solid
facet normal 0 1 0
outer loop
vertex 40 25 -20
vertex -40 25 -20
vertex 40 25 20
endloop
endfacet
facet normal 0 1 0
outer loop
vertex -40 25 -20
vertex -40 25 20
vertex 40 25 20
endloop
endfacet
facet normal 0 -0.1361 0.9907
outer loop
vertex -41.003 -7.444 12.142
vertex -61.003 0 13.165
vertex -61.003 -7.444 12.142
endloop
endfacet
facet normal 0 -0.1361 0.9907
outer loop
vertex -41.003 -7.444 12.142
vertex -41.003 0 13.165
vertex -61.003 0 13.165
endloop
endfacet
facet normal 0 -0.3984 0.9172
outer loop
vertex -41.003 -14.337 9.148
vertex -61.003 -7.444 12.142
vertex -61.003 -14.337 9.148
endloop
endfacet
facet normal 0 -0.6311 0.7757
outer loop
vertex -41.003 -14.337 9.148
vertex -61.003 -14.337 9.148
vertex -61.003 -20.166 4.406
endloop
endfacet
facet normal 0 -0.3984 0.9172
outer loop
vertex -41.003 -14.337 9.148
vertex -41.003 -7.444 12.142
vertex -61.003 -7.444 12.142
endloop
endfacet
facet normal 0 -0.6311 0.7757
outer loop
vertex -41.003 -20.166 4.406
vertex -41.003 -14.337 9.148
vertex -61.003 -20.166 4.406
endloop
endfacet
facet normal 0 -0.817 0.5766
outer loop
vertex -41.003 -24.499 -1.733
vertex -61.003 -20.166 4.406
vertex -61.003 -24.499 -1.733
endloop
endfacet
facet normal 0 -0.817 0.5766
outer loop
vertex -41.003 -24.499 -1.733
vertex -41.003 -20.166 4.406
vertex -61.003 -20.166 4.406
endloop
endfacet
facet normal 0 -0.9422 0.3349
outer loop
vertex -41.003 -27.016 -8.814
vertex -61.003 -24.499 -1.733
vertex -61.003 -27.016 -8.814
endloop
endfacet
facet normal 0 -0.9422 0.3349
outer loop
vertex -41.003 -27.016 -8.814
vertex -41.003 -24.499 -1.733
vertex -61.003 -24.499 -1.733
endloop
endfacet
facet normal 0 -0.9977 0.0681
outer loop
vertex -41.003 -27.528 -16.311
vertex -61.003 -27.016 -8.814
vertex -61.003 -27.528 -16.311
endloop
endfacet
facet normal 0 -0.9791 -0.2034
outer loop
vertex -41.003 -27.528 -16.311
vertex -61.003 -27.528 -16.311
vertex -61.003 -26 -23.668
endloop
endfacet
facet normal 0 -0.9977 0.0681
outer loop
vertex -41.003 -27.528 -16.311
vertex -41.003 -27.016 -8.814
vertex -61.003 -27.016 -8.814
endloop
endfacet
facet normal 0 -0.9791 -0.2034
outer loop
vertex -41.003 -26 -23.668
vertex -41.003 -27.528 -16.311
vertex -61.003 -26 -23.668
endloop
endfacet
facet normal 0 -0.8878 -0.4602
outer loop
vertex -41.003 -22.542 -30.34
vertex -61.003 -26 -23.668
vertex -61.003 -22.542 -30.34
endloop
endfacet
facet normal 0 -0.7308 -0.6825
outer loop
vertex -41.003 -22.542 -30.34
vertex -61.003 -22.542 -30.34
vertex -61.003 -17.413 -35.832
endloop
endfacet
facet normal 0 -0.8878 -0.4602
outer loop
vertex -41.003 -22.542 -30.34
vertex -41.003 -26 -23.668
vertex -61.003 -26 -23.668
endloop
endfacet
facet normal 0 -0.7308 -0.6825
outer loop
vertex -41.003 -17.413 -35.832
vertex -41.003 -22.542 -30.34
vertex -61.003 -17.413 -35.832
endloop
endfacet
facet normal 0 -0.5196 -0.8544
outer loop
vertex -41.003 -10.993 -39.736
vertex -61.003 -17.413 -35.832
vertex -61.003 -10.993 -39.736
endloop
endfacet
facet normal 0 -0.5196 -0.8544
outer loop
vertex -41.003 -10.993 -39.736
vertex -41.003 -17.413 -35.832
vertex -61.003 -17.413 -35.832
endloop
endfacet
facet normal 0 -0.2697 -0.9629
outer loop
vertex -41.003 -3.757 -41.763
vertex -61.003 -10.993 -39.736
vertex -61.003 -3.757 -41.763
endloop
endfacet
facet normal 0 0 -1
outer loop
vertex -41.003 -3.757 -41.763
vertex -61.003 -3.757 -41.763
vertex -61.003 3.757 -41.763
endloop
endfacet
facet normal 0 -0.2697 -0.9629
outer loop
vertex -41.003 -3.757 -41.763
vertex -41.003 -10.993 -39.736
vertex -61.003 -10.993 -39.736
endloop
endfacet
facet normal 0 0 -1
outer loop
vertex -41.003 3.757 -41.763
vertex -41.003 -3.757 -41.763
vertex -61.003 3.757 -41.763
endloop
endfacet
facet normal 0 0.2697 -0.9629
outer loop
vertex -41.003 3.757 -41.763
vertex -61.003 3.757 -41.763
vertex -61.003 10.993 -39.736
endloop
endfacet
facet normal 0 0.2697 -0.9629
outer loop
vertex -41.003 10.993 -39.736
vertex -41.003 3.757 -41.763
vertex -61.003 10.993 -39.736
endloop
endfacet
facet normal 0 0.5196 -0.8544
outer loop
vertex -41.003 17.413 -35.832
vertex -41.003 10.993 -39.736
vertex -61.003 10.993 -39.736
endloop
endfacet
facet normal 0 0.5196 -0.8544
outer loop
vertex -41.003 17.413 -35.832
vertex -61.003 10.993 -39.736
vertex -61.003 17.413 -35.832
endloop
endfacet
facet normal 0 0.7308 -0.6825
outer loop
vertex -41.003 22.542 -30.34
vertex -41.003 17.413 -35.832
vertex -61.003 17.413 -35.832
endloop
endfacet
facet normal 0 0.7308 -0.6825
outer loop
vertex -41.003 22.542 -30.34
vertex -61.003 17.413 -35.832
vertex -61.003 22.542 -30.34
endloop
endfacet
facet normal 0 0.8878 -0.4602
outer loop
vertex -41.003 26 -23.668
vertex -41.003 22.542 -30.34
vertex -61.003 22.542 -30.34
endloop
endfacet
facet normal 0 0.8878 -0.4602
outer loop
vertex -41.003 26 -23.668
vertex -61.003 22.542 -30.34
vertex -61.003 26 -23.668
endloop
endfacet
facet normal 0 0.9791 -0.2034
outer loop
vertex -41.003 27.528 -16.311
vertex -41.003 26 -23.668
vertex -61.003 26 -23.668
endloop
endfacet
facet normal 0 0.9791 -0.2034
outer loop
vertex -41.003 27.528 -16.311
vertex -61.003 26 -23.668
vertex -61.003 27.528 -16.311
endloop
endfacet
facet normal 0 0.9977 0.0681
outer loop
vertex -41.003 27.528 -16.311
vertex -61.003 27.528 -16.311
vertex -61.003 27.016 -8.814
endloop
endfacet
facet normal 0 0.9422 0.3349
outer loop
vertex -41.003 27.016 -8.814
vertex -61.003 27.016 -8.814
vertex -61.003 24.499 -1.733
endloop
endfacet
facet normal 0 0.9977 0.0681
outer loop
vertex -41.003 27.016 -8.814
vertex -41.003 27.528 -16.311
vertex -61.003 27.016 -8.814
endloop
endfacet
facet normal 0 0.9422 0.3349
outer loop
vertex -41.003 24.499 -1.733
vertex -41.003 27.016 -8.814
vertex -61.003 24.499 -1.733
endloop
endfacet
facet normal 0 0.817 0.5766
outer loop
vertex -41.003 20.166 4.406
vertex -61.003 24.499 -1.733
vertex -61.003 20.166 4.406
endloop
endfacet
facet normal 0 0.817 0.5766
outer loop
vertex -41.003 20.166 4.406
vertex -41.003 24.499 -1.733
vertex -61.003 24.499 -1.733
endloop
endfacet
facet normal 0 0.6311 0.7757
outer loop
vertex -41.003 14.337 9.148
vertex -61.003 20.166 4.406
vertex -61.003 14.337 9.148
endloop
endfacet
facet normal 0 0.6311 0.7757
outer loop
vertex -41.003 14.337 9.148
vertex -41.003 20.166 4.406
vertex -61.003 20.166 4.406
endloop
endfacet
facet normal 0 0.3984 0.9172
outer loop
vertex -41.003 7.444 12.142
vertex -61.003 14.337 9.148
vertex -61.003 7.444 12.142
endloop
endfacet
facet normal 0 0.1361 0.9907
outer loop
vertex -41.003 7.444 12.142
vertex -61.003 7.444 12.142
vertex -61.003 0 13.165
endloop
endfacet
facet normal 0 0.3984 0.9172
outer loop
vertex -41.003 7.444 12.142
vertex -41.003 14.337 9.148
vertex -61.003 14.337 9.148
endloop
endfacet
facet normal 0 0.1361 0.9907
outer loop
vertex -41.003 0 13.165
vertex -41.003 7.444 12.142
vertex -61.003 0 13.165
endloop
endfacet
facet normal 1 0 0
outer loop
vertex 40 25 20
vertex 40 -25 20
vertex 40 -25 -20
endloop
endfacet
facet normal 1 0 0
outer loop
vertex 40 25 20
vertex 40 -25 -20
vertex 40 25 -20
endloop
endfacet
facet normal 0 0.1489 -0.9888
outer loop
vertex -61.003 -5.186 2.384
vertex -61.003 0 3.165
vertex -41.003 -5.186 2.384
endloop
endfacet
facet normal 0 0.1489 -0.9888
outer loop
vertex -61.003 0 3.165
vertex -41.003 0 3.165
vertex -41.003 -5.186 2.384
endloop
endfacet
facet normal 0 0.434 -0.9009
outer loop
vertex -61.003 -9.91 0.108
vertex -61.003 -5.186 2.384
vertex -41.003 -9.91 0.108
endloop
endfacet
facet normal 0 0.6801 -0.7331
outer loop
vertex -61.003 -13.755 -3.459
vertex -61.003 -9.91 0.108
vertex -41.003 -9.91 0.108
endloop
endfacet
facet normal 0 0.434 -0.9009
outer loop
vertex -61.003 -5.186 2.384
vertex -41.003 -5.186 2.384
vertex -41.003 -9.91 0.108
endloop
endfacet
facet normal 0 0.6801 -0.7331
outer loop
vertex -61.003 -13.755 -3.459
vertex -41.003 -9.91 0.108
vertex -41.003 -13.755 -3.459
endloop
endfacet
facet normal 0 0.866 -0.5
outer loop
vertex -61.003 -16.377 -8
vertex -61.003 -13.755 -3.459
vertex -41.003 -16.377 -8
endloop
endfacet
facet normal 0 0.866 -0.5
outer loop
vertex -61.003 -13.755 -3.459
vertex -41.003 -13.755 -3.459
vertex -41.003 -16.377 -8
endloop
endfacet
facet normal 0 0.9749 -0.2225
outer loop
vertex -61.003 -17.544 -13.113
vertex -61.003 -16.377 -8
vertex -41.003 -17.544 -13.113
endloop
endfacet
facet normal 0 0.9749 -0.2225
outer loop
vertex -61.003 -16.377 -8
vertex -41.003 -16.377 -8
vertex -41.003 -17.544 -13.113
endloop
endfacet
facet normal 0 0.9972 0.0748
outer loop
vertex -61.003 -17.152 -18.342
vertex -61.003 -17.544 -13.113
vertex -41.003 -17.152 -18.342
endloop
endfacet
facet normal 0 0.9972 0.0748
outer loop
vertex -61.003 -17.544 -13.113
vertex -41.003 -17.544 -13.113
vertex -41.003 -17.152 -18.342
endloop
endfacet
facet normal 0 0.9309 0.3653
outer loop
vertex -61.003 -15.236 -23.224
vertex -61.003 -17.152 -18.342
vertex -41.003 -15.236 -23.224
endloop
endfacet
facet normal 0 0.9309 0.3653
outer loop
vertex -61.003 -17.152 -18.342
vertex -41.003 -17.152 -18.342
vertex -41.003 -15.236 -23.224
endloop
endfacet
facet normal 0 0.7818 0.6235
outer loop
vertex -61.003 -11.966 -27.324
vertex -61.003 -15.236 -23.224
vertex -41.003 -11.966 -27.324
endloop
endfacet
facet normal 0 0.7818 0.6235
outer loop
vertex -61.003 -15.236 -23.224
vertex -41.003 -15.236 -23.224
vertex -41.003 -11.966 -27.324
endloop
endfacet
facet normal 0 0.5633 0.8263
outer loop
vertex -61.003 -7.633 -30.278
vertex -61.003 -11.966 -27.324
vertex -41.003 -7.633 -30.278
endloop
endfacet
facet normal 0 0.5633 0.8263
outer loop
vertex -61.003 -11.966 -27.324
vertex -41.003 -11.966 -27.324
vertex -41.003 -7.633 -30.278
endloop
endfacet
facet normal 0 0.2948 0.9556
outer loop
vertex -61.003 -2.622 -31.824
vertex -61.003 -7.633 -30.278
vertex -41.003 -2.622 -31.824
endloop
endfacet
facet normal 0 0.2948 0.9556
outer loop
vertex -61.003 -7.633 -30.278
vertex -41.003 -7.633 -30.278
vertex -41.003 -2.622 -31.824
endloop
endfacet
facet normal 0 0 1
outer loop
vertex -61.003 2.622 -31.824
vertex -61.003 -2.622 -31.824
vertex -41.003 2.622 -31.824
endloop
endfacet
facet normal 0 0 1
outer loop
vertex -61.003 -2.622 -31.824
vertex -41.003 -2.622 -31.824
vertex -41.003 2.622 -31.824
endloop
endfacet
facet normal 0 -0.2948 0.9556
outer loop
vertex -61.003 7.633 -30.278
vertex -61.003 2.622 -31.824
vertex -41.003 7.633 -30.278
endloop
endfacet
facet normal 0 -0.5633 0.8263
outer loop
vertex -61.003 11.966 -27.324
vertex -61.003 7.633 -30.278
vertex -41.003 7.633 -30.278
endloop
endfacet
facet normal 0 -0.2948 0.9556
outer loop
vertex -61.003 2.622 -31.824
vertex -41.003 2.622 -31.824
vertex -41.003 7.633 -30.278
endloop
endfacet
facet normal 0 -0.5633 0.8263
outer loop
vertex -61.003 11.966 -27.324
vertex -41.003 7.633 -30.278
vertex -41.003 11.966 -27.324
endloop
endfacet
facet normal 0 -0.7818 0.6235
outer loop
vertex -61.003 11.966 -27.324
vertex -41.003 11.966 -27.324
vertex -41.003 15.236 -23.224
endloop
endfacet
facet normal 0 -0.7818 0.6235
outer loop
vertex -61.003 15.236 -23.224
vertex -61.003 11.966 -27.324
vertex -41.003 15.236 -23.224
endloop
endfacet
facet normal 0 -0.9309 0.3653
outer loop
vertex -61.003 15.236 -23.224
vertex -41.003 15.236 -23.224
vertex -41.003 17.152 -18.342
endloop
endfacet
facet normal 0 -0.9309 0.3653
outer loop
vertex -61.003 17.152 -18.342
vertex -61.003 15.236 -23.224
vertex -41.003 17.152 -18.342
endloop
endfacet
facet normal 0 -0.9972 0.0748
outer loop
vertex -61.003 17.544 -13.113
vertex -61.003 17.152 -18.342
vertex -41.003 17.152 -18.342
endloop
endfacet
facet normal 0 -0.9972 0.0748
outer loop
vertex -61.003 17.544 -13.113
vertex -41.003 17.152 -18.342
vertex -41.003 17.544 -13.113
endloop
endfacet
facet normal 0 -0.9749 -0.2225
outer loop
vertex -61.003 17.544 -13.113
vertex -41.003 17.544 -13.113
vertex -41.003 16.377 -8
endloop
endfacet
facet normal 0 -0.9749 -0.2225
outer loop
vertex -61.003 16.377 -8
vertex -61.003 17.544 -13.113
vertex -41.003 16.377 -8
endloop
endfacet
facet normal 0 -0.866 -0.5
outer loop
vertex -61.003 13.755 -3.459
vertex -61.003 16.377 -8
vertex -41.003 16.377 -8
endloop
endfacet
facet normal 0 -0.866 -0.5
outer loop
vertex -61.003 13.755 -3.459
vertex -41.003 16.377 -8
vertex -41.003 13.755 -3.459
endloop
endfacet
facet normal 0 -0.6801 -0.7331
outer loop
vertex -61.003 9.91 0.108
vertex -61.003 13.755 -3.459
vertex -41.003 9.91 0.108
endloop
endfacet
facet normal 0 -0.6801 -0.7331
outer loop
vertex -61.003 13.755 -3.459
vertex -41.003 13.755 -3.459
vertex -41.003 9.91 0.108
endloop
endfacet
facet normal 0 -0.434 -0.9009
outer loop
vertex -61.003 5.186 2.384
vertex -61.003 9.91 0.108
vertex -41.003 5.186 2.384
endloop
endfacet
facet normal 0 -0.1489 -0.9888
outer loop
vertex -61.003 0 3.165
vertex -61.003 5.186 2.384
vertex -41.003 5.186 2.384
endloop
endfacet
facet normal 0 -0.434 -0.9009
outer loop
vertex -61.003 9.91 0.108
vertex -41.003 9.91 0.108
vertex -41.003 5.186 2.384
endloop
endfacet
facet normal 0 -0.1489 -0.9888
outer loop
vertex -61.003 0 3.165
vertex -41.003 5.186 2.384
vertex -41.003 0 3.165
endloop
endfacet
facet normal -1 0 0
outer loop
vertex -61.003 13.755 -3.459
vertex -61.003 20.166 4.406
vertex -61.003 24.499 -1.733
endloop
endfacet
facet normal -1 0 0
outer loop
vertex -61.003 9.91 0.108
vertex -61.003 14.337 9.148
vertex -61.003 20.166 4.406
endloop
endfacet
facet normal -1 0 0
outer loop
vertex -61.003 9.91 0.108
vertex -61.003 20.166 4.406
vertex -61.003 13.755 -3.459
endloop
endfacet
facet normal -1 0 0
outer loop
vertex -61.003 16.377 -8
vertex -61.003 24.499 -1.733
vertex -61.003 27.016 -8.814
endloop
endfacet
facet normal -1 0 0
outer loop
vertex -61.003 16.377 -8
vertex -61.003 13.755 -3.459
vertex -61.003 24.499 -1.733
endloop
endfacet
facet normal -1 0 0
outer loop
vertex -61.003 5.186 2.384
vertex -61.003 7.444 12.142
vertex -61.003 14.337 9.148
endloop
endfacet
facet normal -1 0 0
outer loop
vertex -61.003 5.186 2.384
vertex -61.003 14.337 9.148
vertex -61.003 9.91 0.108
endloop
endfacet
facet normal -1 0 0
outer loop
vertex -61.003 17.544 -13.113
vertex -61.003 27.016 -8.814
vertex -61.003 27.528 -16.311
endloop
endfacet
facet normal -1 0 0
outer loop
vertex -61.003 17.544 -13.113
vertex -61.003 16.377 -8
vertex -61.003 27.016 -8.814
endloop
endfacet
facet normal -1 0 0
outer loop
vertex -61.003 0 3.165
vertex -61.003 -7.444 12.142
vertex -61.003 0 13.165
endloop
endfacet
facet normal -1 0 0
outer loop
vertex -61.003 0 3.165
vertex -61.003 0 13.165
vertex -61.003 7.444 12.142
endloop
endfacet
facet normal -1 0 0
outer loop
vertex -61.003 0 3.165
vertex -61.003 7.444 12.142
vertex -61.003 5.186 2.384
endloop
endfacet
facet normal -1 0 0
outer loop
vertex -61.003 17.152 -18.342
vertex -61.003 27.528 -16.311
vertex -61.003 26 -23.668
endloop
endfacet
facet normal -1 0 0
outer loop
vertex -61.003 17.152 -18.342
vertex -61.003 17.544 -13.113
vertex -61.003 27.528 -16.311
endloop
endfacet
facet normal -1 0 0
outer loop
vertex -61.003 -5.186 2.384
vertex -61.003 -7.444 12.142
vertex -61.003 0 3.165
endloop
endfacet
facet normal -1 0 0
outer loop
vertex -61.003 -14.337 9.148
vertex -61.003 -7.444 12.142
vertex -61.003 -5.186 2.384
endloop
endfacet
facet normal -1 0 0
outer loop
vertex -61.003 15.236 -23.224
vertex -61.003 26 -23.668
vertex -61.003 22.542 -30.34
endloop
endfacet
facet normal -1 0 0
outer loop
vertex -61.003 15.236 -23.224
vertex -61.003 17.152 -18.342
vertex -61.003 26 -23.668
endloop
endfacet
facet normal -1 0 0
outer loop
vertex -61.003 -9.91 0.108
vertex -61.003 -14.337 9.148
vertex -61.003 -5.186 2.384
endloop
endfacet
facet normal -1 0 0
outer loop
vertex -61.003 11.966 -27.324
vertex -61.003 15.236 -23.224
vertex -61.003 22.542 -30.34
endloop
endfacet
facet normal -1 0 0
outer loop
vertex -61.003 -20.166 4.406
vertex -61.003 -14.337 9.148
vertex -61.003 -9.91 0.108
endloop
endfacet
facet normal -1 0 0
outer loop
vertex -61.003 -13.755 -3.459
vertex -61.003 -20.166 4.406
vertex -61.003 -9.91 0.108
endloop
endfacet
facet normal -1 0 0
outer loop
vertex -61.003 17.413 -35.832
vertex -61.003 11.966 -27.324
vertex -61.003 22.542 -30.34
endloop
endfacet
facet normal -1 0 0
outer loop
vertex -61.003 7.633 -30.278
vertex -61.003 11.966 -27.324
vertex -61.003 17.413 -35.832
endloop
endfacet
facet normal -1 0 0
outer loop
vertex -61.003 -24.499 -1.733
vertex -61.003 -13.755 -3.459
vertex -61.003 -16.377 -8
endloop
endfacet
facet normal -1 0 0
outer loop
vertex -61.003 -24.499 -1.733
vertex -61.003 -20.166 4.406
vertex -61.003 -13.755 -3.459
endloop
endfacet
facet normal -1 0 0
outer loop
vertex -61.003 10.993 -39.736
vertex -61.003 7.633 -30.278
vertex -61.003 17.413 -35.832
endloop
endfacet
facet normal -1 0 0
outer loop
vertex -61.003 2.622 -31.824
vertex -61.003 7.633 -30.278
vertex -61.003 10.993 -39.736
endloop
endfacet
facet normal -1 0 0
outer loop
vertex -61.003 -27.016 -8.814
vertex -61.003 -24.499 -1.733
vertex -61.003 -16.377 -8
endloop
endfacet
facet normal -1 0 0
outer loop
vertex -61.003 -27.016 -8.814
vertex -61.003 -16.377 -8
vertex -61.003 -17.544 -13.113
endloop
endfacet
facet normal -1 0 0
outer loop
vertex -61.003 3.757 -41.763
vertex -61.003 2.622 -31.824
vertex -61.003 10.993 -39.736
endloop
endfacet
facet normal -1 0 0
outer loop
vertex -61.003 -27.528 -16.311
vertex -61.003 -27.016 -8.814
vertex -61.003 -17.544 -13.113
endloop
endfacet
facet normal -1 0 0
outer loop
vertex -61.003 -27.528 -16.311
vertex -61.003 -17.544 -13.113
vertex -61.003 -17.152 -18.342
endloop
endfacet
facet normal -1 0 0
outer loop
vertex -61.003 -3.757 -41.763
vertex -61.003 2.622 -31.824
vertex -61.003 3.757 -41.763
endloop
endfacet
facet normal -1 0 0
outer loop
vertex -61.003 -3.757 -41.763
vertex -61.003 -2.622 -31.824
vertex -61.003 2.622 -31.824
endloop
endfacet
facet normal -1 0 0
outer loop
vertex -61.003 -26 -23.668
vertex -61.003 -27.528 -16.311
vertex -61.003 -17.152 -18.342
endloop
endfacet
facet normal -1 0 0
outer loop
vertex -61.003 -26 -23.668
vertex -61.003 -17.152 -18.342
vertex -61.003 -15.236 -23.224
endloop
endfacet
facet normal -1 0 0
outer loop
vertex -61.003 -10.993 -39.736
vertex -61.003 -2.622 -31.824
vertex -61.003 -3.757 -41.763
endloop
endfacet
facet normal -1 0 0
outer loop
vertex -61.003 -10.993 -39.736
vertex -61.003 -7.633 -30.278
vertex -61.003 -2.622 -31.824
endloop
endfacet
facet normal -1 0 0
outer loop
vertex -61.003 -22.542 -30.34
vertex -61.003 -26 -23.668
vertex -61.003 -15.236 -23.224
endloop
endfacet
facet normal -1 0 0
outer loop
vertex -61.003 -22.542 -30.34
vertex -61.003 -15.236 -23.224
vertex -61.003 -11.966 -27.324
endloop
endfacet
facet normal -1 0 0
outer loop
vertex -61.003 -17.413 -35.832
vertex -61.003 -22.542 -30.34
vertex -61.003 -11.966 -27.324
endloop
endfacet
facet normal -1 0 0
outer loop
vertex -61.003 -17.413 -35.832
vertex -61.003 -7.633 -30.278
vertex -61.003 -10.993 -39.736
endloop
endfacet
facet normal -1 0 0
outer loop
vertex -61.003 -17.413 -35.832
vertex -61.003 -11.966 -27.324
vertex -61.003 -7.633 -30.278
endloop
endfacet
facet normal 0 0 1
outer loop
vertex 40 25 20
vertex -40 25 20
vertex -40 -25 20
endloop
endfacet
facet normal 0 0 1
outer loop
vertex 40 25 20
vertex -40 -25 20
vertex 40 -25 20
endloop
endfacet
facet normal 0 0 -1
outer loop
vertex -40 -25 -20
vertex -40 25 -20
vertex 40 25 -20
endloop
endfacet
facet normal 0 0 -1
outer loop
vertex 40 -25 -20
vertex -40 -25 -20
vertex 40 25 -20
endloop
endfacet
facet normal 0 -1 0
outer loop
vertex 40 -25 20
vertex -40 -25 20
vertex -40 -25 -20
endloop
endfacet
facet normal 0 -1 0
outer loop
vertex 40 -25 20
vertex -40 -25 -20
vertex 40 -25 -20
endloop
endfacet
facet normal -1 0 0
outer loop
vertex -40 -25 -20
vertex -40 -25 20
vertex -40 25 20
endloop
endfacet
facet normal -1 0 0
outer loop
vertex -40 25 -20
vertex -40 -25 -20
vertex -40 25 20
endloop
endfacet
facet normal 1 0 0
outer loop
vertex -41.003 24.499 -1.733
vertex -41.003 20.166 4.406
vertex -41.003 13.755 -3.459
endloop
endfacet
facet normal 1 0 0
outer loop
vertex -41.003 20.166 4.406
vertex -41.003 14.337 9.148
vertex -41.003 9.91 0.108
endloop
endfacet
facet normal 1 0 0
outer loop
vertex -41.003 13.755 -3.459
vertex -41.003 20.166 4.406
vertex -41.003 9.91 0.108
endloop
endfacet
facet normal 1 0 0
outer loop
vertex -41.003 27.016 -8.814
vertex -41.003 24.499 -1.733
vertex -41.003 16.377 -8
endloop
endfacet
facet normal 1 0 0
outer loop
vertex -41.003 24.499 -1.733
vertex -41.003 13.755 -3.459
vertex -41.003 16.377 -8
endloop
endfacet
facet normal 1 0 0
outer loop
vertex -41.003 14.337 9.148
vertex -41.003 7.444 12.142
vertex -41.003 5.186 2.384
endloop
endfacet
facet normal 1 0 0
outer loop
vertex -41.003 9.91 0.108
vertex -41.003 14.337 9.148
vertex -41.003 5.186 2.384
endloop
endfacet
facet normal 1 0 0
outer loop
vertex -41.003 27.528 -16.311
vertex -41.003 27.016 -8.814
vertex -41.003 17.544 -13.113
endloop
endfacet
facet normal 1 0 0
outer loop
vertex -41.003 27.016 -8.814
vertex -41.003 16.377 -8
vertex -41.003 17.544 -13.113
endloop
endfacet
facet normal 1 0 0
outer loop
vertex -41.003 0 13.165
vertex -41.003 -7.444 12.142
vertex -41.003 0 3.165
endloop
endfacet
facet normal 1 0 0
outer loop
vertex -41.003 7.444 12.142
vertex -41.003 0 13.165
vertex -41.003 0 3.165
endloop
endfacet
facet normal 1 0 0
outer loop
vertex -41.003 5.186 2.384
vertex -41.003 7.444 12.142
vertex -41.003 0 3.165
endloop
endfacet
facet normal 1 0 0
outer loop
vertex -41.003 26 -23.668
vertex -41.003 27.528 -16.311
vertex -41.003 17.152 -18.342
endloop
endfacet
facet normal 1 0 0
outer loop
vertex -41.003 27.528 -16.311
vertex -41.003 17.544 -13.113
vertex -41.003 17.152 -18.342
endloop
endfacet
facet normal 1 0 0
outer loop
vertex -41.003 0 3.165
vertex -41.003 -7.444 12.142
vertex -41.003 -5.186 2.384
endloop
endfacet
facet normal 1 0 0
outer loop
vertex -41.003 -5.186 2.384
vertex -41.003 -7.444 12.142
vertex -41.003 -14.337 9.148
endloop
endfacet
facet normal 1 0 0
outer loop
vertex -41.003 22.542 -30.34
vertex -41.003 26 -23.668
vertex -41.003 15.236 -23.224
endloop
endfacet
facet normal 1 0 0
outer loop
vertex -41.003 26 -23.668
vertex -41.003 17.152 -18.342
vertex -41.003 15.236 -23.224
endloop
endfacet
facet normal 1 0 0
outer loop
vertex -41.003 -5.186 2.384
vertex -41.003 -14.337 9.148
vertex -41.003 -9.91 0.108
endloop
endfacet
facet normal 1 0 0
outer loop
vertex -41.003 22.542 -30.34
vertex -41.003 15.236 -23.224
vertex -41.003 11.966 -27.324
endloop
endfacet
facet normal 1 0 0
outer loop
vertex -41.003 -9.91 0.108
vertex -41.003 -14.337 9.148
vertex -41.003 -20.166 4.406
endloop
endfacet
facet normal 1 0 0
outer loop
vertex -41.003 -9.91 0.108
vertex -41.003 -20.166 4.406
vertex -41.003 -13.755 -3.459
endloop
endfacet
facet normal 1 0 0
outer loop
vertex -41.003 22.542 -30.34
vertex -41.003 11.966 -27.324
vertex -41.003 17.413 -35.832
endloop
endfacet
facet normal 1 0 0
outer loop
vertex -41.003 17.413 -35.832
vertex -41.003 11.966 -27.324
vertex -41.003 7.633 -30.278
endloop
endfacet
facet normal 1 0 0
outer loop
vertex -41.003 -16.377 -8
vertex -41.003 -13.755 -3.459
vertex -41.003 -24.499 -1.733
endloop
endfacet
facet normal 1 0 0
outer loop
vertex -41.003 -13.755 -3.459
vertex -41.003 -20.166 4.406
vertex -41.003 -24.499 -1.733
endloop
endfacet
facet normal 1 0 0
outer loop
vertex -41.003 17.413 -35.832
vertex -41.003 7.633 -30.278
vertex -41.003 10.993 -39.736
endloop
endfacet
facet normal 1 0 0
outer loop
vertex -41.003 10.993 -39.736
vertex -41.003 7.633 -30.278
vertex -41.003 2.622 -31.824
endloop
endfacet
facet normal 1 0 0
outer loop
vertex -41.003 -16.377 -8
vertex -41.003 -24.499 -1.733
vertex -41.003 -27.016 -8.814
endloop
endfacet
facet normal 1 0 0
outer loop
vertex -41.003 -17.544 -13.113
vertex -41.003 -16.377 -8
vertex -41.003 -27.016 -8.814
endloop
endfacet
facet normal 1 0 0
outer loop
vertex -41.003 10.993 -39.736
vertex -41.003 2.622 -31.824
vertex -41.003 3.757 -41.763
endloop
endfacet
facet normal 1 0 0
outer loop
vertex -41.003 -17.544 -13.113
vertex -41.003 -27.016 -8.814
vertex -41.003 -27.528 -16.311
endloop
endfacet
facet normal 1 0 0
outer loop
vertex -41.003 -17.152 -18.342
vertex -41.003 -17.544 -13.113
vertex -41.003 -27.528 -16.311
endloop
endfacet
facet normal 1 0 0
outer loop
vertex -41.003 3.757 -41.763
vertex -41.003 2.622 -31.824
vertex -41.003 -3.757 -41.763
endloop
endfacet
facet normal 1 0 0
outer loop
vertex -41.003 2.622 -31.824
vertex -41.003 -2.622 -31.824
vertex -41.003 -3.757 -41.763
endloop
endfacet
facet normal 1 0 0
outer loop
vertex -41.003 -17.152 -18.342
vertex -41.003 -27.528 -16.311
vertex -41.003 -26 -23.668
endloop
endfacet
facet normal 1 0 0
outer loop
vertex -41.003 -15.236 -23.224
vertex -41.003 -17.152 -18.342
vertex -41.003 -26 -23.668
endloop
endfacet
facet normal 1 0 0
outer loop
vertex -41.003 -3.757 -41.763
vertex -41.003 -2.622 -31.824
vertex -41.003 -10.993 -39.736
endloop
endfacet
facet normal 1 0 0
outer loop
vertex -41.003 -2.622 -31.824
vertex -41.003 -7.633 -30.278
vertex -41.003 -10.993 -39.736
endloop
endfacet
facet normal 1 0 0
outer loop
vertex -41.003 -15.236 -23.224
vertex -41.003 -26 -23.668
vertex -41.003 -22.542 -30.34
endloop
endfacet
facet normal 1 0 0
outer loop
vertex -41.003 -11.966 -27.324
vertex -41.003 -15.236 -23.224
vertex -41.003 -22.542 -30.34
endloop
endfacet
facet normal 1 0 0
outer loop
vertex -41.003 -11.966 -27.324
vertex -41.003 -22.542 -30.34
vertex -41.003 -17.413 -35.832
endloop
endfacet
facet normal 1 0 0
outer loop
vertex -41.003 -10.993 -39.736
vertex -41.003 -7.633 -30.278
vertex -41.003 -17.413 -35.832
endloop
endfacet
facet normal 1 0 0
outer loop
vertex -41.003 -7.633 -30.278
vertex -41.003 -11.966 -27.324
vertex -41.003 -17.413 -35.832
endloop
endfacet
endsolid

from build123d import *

# Parameters (mm, degrees)
F0_W     = 80
F0_H     = 50
F1_DEPTH = 20
F3_W     = 20
F3_H     = 10


with BuildPart() as f1:
    # F0 (on Top) → F1 (new body, symmetric)
    with BuildSketch(Plane.XY):
        Rectangle(F0_W, F0_H)
    extrude(amount=F1_DEPTH, both=True)


with BuildPart() as f5:
    # F3 (on Front) → F5 (revolve)
    with BuildSketch(Plane.XZ):
        with Locations((-51.002517, 8.165131)):
            Rectangle(F3_W, F3_H)
    revolve(axis=Axis((-1.774587, 0, -14.427638), (1, 0, 0)))


solid = Compound([f1.part, f5.part])
